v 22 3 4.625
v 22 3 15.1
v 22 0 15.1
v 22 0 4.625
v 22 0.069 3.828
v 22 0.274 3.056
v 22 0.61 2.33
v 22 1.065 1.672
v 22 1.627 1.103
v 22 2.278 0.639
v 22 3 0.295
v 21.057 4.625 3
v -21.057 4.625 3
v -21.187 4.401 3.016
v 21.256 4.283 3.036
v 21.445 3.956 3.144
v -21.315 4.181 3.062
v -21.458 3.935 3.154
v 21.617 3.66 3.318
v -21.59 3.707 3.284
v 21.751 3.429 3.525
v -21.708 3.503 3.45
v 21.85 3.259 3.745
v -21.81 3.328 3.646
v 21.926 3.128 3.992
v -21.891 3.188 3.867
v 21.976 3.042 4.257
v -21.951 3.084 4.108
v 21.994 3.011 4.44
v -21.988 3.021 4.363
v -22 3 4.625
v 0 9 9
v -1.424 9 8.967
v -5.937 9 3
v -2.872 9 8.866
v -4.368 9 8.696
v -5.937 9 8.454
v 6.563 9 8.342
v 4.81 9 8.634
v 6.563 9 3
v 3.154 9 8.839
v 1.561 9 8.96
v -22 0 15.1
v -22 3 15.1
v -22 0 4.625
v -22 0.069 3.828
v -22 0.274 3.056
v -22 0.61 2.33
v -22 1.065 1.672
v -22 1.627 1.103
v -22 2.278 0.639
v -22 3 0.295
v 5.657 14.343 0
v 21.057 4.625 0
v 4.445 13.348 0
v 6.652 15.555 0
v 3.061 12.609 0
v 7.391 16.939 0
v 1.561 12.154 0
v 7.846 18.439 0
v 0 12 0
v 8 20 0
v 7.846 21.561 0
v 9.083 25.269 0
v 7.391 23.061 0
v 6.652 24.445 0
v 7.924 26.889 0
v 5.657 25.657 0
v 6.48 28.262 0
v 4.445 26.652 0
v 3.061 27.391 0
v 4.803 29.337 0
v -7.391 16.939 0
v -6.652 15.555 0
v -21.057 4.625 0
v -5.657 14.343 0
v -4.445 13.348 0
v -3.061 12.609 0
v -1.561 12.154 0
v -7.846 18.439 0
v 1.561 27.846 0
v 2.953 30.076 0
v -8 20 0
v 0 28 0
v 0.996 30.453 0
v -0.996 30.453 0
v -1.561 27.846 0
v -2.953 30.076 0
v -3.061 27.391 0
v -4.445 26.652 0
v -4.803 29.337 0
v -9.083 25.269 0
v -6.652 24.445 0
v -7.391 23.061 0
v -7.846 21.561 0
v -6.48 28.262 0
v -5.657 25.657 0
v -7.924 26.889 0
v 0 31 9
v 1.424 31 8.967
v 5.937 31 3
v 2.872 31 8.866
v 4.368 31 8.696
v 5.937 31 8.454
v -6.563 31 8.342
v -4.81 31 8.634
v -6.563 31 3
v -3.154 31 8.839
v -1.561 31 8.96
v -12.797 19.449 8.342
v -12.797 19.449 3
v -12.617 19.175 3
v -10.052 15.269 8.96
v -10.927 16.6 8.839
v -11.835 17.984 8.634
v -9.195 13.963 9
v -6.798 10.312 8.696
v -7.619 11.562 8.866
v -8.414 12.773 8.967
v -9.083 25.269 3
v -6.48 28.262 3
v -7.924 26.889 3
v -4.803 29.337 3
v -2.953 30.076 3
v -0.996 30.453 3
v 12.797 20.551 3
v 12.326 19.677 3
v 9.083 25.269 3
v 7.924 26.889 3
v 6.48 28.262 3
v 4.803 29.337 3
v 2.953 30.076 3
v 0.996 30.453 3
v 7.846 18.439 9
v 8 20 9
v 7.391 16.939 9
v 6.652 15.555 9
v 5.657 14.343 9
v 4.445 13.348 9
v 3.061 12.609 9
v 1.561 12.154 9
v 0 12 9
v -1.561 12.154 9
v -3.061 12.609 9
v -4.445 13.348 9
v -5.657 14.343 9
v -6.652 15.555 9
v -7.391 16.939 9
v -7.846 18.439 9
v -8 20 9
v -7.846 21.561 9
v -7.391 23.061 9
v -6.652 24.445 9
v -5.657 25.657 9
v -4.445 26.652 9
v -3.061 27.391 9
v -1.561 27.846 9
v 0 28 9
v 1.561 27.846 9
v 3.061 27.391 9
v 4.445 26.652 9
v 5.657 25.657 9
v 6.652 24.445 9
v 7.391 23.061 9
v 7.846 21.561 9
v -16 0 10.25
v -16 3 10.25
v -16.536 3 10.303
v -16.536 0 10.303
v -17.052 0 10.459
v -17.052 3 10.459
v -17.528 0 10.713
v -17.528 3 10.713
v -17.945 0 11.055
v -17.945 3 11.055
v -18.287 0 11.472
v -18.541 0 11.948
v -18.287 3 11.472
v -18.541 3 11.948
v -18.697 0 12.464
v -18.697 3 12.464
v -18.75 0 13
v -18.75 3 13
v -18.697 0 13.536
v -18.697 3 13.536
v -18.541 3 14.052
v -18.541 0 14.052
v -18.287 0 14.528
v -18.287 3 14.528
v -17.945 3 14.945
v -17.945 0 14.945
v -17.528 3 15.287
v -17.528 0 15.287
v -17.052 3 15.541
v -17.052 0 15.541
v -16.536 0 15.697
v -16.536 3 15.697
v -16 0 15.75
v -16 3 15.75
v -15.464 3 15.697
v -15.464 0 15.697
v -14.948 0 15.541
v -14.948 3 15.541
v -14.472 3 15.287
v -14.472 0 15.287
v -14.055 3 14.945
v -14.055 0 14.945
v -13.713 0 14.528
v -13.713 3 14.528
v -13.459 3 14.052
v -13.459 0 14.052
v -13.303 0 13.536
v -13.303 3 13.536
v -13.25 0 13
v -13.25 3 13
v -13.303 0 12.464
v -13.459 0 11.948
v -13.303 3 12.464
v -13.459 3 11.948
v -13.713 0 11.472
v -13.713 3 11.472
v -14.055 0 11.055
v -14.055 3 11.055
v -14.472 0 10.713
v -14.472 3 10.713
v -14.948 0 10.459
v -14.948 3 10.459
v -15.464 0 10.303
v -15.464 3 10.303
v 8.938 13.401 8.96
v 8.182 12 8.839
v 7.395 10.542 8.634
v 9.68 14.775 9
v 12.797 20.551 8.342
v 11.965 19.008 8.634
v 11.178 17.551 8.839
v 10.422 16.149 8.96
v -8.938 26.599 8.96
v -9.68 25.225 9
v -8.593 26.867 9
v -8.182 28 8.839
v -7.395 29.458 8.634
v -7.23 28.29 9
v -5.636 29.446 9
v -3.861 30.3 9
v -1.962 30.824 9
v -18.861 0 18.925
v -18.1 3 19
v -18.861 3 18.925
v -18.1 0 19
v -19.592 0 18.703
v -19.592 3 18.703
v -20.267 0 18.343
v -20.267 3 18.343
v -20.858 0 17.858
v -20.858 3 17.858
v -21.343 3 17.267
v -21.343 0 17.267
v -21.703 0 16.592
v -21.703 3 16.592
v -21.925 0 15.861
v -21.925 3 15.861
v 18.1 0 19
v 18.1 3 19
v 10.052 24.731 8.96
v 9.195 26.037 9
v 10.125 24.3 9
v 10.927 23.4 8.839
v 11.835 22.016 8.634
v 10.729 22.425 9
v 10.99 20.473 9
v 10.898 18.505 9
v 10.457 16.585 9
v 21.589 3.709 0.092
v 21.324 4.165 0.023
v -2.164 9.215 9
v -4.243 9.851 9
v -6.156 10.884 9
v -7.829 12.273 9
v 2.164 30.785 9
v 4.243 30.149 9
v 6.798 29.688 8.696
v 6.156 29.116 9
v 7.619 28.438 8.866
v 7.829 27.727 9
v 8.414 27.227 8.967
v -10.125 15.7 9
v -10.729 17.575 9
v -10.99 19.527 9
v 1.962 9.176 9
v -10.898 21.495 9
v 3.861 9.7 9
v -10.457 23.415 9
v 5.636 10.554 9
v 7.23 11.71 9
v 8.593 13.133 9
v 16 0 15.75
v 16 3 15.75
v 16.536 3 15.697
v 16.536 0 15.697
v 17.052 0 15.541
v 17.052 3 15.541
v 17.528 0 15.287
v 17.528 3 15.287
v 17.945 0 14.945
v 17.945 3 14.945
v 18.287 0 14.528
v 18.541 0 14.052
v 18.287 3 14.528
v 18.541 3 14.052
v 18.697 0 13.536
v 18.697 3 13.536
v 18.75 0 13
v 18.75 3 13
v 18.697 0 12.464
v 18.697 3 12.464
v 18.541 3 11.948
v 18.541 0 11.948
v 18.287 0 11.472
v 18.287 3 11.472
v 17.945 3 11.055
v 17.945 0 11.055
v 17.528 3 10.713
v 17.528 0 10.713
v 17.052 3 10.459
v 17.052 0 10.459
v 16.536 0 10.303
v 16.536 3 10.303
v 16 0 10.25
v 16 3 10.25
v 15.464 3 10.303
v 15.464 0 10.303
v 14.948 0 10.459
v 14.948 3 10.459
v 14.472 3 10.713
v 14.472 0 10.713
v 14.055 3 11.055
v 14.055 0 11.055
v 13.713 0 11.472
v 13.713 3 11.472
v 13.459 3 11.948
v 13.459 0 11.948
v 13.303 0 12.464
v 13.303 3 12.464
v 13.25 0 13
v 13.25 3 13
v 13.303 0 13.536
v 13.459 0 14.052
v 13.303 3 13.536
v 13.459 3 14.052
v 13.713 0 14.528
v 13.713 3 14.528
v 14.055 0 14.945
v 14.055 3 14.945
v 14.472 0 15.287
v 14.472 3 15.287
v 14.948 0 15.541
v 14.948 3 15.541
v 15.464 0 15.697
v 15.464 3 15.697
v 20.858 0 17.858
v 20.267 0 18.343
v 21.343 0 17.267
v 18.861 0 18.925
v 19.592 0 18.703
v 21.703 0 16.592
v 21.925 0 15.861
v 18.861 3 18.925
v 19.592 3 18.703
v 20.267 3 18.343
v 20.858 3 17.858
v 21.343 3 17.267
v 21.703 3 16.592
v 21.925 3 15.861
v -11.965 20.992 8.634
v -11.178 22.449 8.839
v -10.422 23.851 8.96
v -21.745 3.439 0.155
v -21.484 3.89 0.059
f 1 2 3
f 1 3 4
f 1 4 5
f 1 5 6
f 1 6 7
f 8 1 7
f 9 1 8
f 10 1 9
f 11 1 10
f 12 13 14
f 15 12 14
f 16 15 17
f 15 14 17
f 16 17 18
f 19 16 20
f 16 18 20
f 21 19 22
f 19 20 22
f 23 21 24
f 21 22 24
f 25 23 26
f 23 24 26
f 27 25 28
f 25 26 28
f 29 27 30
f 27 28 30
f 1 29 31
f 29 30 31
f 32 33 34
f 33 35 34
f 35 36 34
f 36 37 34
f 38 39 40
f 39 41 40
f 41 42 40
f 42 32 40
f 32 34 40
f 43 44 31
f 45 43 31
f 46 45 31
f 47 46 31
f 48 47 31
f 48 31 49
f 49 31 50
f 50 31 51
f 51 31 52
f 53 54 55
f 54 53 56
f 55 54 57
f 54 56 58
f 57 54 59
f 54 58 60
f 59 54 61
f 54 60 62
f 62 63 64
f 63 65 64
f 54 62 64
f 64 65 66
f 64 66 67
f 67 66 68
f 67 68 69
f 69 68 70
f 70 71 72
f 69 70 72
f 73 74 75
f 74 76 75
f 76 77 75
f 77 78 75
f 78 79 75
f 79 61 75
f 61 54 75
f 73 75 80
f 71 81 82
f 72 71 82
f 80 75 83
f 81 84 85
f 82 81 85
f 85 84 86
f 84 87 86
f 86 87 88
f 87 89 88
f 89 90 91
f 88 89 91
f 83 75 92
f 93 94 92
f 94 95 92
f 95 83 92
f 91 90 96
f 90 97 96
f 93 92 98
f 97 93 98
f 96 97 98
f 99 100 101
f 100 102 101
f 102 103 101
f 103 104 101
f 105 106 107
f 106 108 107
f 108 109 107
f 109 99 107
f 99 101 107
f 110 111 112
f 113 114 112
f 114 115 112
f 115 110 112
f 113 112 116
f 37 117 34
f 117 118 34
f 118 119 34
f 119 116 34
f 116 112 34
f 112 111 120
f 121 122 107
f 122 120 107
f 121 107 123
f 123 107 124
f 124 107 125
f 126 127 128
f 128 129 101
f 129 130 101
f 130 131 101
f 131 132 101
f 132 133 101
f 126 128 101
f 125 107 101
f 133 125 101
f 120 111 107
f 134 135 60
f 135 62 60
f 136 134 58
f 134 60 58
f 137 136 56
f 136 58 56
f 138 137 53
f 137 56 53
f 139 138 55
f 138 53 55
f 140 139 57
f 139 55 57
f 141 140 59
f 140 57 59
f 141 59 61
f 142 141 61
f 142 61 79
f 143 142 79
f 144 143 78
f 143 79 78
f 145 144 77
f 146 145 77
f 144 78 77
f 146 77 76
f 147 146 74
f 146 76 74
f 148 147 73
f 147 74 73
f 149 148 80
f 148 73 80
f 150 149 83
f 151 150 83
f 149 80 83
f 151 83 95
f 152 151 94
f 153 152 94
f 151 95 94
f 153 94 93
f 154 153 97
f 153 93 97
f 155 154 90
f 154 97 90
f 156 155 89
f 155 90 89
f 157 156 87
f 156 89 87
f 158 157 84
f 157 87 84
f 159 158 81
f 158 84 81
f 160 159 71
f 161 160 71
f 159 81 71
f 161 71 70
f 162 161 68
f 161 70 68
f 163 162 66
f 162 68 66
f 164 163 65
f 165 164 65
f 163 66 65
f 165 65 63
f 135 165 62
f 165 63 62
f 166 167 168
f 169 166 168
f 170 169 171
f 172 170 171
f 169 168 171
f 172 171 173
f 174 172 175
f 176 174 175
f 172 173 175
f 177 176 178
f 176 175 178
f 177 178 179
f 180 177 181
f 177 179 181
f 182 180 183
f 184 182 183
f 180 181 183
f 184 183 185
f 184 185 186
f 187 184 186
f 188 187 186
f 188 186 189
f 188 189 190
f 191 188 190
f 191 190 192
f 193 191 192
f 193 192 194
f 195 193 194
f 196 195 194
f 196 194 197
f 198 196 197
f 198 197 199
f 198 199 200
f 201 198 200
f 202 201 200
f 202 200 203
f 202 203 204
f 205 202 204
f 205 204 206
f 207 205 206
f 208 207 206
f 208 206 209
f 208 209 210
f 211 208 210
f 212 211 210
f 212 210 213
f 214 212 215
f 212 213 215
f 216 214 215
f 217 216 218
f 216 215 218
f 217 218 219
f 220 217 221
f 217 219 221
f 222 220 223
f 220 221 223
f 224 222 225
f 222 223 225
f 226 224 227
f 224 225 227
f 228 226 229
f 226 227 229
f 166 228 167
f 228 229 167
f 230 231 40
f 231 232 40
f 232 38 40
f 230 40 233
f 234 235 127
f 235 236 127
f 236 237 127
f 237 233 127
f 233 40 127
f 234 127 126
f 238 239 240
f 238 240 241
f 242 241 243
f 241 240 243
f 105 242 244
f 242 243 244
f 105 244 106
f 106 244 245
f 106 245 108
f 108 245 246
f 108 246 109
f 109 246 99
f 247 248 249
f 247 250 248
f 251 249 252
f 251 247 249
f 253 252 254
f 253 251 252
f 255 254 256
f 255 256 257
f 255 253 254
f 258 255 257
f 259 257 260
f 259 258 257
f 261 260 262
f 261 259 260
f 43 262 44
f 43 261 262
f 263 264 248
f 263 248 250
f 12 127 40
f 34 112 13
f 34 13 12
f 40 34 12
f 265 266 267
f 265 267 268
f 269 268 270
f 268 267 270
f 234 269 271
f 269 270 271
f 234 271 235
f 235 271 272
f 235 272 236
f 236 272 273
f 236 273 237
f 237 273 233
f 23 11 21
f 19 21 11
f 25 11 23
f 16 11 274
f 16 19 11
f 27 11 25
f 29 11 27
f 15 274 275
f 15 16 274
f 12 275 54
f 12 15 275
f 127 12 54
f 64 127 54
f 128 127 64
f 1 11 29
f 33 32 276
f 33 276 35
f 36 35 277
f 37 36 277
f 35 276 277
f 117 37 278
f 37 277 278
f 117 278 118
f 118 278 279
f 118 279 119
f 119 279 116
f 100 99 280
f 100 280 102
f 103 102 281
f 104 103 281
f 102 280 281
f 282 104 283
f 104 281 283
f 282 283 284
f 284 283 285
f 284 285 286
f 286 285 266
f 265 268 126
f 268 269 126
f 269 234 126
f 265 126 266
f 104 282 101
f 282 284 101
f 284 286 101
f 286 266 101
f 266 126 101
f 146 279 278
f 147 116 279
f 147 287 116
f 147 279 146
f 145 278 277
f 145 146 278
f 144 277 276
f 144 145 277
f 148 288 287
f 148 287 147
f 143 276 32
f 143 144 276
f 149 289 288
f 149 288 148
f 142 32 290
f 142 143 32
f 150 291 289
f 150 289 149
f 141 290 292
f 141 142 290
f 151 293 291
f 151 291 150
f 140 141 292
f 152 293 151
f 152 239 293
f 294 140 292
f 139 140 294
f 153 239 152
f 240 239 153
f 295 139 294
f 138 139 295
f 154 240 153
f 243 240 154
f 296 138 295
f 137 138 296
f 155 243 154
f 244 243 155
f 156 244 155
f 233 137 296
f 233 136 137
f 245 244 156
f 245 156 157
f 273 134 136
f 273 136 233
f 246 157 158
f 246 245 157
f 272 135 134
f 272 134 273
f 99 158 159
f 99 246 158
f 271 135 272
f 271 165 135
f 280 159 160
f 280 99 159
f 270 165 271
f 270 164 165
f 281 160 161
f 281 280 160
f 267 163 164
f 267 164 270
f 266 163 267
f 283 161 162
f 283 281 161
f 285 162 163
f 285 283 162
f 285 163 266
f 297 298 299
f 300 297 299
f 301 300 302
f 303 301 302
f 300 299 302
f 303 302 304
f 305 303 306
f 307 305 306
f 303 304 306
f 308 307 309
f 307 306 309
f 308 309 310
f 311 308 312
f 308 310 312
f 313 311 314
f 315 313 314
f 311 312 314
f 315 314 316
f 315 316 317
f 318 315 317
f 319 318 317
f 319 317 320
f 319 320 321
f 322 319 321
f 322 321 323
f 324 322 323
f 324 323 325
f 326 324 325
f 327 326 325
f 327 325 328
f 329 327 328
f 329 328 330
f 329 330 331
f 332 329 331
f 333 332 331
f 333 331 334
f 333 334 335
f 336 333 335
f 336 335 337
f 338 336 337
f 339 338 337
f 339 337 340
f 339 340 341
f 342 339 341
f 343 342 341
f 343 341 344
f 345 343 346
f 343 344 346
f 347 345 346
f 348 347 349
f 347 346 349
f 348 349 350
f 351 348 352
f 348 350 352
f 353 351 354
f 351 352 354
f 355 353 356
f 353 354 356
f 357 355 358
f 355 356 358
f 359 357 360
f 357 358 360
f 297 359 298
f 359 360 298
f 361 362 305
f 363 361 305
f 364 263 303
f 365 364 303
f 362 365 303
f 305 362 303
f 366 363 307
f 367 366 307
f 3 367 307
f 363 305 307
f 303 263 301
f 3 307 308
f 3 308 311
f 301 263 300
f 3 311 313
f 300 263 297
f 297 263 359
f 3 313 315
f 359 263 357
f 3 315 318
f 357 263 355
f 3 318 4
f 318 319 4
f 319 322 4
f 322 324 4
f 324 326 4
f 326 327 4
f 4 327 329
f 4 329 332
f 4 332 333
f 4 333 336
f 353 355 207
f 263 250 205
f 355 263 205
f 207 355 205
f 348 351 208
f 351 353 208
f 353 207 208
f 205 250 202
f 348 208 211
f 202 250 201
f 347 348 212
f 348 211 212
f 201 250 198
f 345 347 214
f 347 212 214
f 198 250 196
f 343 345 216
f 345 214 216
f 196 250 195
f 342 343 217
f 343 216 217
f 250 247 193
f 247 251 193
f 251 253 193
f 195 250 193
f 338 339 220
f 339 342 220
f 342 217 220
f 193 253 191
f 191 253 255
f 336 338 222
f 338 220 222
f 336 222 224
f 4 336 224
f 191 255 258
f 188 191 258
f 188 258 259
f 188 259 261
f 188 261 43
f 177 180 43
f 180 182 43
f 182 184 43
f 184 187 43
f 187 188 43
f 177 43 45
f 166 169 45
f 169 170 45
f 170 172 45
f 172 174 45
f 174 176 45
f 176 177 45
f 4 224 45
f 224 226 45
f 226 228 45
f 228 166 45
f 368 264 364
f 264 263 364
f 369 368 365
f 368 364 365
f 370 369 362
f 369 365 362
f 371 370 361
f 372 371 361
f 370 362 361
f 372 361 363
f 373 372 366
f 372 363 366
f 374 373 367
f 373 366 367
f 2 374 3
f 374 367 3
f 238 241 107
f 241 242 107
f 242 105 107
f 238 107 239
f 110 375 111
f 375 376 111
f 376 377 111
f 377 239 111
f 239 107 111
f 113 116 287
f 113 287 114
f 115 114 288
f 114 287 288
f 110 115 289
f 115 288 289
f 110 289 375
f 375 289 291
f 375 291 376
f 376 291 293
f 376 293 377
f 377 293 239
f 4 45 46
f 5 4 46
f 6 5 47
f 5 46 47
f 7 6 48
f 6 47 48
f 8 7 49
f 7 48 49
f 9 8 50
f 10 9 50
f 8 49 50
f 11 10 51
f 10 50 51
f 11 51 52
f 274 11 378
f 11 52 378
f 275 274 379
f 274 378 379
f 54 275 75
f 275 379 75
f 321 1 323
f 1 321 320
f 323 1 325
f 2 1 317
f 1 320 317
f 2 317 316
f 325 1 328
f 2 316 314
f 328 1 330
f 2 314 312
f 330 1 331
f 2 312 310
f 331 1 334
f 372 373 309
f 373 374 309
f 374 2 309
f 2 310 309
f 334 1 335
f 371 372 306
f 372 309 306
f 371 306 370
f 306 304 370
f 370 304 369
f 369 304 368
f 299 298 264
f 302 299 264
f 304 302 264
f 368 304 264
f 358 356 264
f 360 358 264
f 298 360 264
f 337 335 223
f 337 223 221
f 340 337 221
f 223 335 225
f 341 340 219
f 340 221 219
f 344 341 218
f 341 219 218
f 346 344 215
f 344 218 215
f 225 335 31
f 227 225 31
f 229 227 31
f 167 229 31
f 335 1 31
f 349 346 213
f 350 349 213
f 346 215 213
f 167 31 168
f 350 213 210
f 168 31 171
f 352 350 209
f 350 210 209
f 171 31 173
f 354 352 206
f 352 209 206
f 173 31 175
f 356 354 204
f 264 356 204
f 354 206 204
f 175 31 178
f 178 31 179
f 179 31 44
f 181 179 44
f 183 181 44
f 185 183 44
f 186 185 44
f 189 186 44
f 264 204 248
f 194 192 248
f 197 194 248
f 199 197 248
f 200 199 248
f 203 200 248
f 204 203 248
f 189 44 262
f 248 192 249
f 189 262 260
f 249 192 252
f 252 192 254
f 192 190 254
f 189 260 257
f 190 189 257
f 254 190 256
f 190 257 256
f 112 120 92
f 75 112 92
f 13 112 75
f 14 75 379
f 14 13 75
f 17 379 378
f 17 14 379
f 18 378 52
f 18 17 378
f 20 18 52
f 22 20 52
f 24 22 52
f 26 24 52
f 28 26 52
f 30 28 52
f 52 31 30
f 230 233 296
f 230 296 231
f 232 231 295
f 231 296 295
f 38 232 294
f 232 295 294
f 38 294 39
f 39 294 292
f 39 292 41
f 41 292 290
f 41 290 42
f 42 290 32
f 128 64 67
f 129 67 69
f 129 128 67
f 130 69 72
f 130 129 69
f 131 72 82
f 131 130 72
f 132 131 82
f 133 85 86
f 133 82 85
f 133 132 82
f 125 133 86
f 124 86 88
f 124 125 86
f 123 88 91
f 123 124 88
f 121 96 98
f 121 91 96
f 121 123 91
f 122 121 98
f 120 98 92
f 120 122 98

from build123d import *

# Parameters (mm, degrees)
EXTRUDE_START                   = -22
EXTRUDE_1_DEPTH                 = 44
CUT_EXTRUDE_1_DEPTH             = 10
CUT_EXTRUDE_1_DIRECTION_2_REACH = 42.869
SKETCH_6_R                      = 8
CUT_EXTRUDE_2_DEPTH             = 41.868692174
SKETCH_7_R                      = 2.75
CUT_EXTRUDE_3_DEPTH             = 41.015621949
FILLET_1_R                      = 3.9
EXTRUDE_2_DEPTH                 = 6
SKETCH_11_R                     = 8
CUT_EXTRUDE_4_DEPTH             = 42.243181255


with BuildPart() as part:
    # 草图4 → 凸台-拉伸1 (new body)
    with BuildSketch(Plane(origin=(0, 0, 0), x_dir=(0, 0, -1), z_dir=(1, 0, 0)).offset(EXTRUDE_START)):
        with BuildLine():
            Line((-19, 0), (-4.625, 0))
            ThreePointArc((-4.625, 0), (-1.354631137, 1.354631137), (0, 4.625))
            Line((0, 4.625), (0, 30.5))
            Line((0, 30.5), (-3, 30.5))
            Line((-3, 30.5), (-3, 4.625))
            ThreePointArc((-3, 4.625), (-3.475951481, 3.475951481), (-4.625, 3))
            Line((-4.625, 3), (-19, 3))
            Line((-19, 3), (-19, 0))
        make_face()
    extrude(amount=EXTRUDE_1_DEPTH)

    # 草图5 → 切除-拉伸1 (cut)
    with BuildSketch(Plane.XY.offset(3)):
        with BuildLine():
            Line((-9.082524892, 25.268561625), (-22, 3))
            Line((-22, 3), (-22, 31.5))
            Line((-22, 31.5), (22, 31.5))
            Line((22, 31.5), (22, 3))
            Line((22, 3), (9.082524892, 25.268561625))
            ThreePointArc((9.082524892, 25.268561625), (0, 30.5), (-9.082524892, 25.268561625))
        make_face()
    extrude(amount=-CUT_EXTRUDE_1_DEPTH, mode=Mode.SUBTRACT)

    # 切除-拉伸1 direction 2: up to this face of the body (flat: up to its plane)
    cut_extrude_1_direction_2_end = Plane(part.part.faces().sort_by_distance((0, 1.5, 19))[0])
    # 草图5 → 切除-拉伸1 direction 2 (cut, up to the picked face)
    with BuildSketch(Plane.XY.offset(3), mode=Mode.PRIVATE) as cut_extrude_1_direction_2_sk1:
        with BuildLine():
            Line((-9.082524892, 25.268561625), (-22, 3))
            Line((-22, 3), (-22, 31.5))
            Line((-22, 31.5), (22, 31.5))
            Line((22, 31.5), (22, 3))
            Line((22, 3), (9.082524892, 25.268561625))
            ThreePointArc((9.082524892, 25.268561625), (0, 30.5), (-9.082524892, 25.268561625))
        make_face()
    cut_extrude_1_direction_2_tool1 = split(extrude(cut_extrude_1_direction_2_sk1.sketch, amount=CUT_EXTRUDE_1_DIRECTION_2_REACH, mode=Mode.PRIVATE), bisect_by=cut_extrude_1_direction_2_end, keep=Keep.BOTH, mode=Mode.PRIVATE)
    add(cut_extrude_1_direction_2_tool1.solids().sort_by(Axis((-15.994729, 14.397326, 3), (0, 0, 1)))[0], mode=Mode.SUBTRACT)

    # 草图6 → 切除-拉伸2 (cut, through all)
    with BuildSketch(Plane.XY.offset(3)):
        with Locations((0, 20)):
            Circle(SKETCH_6_R)
    extrude(amount=-CUT_EXTRUDE_2_DEPTH, mode=Mode.SUBTRACT)

    # 草图7 → 切除-拉伸3 (cut, through all)
    with BuildSketch(Plane(origin=(0, 3, 0), x_dir=(1, 0, 0), z_dir=(0, 1, 0))):
        with Locations(Location((16, -13, 0), (0, 0, 270))):
            Circle(SKETCH_7_R)
        with Locations(Location((-16, -13, 0), (0, 0, 90))):
            Circle(SKETCH_7_R)
    extrude(amount=-CUT_EXTRUDE_3_DEPTH, mode=Mode.SUBTRACT)

    # 圆角1
    fillet_1_edges = [part.edges().sort_by_distance(p)[0] for p in [
        (-22, 1.5, 19),
        (22, 1.5, 19),
    ]]
    fillet(fillet_1_edges, radius=FILLET_1_R)

    # 草图9 → 凸台-拉伸2 (add)
    with BuildSketch(Plane.XY.offset(3)):
        Polygon((-5.937171044, 9), (6.562828956, 9), (12.797171044, 20.550578963), (5.937171044, 31), (-6.562828956, 31), (-12.797171044, 19.449421037), align=None)
    extrude(amount=EXTRUDE_2_DEPTH)

    # 草图10 → 切除-旋转1 (revolve, cut)
    with BuildSketch(Plane(origin=(0, 0, 0), x_dir=(0, 0, 1), z_dir=(1, 0, 0))):
        Polygon((9, -31), (9, -34.5), (7.72610418, -34.5), align=None)
    revolve(axis=Axis((0, 20, 71.423754158), (0, 0, -1)), mode=Mode.SUBTRACT)

    # 草图11 → 切除-拉伸4 (cut, through all)
    with BuildSketch(Plane(origin=(0, 0, 3), x_dir=(-1, 0, 0), z_dir=(0, 0, -1))):
        with Locations(Location((0, 20, 0), (0, 0, 180))):
            Circle(SKETCH_11_R)
    extrude(amount=-CUT_EXTRUDE_4_DEPTH, mode=Mode.SUBTRACT)


solid = part.part
